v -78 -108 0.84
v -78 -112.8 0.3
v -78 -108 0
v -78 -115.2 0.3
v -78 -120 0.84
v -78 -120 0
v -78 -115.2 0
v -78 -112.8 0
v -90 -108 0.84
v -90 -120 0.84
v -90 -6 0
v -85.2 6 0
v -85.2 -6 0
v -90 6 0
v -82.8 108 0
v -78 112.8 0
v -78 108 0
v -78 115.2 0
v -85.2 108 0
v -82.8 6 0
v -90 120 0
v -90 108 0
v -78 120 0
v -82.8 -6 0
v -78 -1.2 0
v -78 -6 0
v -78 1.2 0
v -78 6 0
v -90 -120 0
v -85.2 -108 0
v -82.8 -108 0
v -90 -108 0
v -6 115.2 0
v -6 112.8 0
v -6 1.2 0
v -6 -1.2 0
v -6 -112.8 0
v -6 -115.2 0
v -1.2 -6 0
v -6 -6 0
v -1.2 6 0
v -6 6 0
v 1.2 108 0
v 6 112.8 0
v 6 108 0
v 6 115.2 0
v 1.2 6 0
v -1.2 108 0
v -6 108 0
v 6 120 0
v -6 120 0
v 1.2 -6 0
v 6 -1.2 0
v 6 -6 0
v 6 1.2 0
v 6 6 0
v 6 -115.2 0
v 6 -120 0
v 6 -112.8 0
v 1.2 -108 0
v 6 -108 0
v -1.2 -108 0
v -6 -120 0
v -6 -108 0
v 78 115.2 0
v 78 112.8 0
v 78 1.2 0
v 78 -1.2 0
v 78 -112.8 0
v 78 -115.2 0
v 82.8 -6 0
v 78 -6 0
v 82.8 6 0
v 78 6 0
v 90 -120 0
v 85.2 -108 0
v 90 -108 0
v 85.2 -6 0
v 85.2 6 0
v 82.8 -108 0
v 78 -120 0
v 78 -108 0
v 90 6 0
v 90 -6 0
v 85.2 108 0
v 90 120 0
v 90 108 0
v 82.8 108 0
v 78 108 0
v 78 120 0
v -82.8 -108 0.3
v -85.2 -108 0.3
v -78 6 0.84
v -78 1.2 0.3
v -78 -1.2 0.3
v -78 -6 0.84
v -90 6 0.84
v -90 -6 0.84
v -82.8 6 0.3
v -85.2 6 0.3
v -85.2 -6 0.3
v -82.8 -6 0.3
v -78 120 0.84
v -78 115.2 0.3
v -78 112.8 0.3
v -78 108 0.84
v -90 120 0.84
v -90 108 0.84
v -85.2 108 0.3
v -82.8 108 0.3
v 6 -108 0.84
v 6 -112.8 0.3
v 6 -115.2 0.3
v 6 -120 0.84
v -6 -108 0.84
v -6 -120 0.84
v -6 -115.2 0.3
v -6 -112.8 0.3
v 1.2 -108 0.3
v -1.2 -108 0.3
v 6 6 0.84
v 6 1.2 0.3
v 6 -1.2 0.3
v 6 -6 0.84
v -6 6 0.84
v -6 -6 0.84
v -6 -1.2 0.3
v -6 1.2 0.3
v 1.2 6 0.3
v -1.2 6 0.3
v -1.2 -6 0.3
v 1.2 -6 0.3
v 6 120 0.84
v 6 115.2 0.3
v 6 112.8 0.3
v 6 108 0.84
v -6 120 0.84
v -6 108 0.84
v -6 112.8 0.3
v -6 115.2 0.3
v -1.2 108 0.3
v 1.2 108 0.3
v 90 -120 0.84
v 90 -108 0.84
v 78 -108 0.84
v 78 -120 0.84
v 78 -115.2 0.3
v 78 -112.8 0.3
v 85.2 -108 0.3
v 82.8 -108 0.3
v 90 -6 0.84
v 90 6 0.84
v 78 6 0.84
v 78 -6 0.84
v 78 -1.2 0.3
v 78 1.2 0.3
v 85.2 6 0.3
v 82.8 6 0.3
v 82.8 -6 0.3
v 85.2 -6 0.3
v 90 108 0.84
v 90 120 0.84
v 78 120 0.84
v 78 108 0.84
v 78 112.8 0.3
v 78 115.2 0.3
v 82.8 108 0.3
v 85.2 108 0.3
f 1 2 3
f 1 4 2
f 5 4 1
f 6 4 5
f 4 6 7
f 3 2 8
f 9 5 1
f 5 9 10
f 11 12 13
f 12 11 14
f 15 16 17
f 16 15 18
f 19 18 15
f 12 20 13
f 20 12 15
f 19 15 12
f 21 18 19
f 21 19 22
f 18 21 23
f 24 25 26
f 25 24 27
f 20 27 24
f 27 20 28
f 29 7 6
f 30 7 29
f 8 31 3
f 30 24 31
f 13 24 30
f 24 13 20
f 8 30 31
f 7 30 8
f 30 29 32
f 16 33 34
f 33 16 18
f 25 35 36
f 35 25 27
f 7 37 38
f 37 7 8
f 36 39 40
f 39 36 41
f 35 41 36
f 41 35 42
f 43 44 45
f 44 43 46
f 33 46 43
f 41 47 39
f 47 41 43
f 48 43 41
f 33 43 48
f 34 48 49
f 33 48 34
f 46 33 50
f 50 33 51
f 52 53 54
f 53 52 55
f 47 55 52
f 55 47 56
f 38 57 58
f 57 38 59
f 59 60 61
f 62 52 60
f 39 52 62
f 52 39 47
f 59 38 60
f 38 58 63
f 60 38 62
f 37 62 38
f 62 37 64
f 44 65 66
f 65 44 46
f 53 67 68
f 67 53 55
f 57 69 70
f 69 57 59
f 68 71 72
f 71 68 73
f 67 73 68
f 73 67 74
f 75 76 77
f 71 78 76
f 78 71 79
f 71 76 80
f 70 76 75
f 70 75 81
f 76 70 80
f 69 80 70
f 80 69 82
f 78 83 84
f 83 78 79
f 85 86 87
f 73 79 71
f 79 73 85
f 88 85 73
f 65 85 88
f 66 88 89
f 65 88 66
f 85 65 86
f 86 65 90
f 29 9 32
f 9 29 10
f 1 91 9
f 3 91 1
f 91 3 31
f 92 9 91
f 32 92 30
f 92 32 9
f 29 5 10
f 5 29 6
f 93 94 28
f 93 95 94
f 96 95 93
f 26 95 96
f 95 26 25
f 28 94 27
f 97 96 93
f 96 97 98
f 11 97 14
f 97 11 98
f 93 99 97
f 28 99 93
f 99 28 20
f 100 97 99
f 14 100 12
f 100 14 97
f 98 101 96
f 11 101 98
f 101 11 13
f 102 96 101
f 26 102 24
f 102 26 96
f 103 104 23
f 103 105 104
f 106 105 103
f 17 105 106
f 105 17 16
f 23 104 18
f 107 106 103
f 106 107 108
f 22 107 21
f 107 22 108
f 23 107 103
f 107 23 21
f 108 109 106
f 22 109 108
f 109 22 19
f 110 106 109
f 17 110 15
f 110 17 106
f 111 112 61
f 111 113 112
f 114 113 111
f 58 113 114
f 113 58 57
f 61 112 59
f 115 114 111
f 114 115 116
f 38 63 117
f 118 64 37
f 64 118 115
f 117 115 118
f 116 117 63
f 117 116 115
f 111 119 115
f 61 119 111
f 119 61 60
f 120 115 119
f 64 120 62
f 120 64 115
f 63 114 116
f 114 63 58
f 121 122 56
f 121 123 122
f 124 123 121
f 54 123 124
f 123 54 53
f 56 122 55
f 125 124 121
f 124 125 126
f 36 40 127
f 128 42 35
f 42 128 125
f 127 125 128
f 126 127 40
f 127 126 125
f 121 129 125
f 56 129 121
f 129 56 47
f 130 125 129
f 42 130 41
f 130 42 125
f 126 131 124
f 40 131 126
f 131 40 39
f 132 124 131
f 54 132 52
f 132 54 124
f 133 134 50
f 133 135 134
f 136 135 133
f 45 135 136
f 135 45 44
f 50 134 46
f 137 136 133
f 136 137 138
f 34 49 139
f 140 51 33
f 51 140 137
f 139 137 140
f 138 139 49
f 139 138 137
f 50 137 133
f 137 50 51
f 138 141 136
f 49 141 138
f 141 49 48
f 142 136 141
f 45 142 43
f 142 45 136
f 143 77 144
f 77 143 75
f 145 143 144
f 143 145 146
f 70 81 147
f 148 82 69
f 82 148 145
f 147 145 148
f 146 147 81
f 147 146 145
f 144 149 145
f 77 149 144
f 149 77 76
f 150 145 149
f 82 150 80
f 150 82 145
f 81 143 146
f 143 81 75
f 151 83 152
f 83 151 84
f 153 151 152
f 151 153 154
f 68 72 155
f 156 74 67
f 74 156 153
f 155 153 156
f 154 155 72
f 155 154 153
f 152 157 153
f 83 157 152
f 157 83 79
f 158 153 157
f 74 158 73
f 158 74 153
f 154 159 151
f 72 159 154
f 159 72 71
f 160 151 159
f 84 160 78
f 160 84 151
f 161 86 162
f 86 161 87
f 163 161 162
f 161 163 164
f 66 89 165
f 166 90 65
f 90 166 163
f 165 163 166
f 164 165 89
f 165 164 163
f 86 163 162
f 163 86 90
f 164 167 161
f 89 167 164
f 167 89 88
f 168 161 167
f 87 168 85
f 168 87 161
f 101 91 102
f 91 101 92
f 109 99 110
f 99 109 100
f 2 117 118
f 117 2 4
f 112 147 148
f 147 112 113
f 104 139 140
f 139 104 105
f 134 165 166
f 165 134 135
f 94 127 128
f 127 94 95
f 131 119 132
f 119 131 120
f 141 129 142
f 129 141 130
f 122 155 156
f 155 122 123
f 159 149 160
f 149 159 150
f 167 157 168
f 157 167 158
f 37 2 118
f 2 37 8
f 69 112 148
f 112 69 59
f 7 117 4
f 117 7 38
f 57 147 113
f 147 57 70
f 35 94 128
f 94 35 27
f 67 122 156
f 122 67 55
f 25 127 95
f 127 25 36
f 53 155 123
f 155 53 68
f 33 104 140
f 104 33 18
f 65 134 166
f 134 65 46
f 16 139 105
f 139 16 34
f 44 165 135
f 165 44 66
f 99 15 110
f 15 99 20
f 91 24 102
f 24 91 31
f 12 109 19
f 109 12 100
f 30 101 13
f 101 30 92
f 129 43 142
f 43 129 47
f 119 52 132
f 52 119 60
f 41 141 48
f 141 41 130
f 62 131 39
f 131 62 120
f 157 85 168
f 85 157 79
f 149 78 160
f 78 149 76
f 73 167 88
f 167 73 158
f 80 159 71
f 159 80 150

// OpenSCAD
////----BedLevelTest.scad----
////----OpenSCAD 2015.03-2----
////----Kijja Chaovanakij----
////----2018.10.7----

/*[printer]*/
//bed x size[210]
bed_xsize=210;
//bed y size[270]
bed_ysize=270;
//bed margin[15]
bed_margin=15;

/*[layer and line]*/
//first layer thickness[0.24]
first_layer_thick=0.30;
//line size [multiplier of nozzle size]
line_size=2.4;

/*[element shape]*/
//element shape
element_shape=0; //[0:square,1:circle]
//element size[12]
element_size=12;
//element thickness[0.84]
element_thick=0.84;

/*[array pattern]*/
//number of array x size[3]
array_xsize=3; //[2:1:5]
//number of array y size[3]
array_ysize=3; //[2:1:5]

////----translate var---
x_c2c=bed_xsize-bed_margin*2-element_size;
y_c2c=bed_ysize-bed_margin*2-element_size;
x_space=x_c2c/(array_xsize-1);
y_space=y_c2c/(array_ysize-1);
echo("x_c2c",x_c2c);
echo("y_c2c",y_c2c);
echo("x_space",x_space);
echo("y_space",y_space);

////----main----
color("LightGreen"){
  element_shape();
  element_line();
}//c
//

module element_shape(){
  for (i=[-x_c2c/2:x_space:x_c2c/2])
    for (j=[-y_c2c/2:y_space:y_c2c/2])
      if (element_shape==0)
        translate([i,j,element_thick/2])
          cube([element_size,element_size,element_thick],true);
      else
        translate([i,j,element_thick/2])
          cylinder(element_thick,element_size/2,element_size/2,true);
}//m
//

module element_line(){
  for (i=[-x_c2c/2+x_space/2:x_space:x_c2c/2-x_space/2])
  for (j=[-y_c2c/2:y_space:y_c2c/2])
    translate([i,j,first_layer_thick/2])
      cube([x_space,line_size,first_layer_thick],true);

  for (i=[-x_c2c/2:x_space:x_c2c/2])
  for (j=[-y_c2c/2+y_space/2:y_space:y_c2c/2-y_space/2])
    translate([i,j,first_layer_thick/2])
      cube([line_size,y_space,first_layer_thick],true);
}//m
